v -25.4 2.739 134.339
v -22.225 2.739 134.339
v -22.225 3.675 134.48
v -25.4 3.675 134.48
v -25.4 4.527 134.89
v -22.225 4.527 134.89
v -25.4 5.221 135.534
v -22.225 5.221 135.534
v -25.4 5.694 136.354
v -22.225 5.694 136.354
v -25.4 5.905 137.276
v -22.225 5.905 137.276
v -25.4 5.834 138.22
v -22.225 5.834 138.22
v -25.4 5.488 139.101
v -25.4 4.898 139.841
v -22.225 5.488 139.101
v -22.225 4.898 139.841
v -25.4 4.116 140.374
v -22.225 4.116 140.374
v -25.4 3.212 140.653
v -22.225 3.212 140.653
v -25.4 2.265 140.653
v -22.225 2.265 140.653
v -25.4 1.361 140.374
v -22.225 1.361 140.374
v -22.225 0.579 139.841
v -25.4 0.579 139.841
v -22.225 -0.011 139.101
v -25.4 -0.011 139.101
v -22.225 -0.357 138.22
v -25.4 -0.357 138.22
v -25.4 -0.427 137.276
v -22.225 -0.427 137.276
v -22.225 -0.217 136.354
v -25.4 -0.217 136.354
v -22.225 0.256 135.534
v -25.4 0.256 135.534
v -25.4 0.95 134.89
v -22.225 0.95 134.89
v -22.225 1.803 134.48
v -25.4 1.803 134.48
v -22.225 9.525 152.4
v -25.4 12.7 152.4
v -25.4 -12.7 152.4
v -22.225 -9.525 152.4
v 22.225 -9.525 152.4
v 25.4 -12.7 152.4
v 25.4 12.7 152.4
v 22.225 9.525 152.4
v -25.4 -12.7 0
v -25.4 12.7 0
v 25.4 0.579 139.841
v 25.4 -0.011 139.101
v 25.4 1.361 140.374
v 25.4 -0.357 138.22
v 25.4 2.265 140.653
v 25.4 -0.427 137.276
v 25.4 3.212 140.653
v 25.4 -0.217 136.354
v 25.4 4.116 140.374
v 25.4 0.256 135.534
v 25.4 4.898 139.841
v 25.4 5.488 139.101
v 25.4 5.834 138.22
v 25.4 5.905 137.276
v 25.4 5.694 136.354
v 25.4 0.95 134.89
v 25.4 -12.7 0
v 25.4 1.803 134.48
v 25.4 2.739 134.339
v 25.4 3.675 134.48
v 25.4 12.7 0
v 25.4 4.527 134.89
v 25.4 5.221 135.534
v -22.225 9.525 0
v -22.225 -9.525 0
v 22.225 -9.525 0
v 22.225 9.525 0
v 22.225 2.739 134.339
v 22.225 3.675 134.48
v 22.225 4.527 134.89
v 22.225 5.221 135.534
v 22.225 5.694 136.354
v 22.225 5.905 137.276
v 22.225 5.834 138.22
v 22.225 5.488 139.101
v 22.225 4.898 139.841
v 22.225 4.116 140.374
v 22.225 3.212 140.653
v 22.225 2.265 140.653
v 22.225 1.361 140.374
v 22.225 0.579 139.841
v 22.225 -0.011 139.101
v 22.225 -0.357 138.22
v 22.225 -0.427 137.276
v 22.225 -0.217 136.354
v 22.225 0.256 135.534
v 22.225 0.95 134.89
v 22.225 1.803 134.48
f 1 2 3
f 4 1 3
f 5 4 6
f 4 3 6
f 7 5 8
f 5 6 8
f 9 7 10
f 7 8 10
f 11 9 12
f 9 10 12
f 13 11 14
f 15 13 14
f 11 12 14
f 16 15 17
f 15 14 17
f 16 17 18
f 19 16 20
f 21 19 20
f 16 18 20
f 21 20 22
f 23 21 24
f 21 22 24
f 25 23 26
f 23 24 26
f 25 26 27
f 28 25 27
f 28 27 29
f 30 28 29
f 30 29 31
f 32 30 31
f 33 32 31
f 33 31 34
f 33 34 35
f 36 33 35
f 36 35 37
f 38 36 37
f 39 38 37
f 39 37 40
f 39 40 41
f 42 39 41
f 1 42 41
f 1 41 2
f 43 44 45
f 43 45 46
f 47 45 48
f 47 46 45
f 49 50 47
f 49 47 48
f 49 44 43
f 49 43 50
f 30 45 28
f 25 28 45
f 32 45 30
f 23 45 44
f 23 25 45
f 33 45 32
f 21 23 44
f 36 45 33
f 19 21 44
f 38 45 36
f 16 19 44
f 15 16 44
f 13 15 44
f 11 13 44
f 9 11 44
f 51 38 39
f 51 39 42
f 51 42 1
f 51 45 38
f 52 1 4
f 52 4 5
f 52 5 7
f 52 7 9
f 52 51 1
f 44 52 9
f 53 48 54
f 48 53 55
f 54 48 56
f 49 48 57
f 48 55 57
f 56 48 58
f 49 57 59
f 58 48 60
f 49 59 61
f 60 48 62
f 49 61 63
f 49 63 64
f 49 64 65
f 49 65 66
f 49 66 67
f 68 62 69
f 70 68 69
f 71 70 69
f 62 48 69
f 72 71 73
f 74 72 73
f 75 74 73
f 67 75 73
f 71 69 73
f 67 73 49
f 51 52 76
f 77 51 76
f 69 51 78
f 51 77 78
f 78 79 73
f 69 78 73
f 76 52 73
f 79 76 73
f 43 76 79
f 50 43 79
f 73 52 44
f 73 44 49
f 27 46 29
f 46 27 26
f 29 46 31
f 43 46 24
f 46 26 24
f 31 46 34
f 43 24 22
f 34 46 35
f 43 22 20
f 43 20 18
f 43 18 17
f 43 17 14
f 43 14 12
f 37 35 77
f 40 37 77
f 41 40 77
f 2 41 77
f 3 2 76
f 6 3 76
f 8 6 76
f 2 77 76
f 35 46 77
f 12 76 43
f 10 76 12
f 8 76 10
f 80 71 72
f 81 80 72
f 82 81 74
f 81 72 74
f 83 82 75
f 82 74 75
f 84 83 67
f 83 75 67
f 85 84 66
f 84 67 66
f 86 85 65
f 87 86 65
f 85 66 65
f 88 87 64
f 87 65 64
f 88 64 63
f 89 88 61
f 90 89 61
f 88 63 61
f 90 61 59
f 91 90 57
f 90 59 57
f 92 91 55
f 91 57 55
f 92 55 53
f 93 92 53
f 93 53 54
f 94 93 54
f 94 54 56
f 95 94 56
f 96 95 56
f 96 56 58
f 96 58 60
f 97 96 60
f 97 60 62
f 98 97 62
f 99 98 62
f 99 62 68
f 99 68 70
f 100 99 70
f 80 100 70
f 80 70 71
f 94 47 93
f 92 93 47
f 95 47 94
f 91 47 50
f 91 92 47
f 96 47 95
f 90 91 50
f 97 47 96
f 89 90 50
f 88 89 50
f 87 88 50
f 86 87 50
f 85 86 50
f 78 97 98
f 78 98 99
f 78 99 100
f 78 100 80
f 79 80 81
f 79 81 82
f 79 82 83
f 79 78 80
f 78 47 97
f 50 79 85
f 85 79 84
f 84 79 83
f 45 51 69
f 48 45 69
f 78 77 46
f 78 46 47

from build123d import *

# Parameters (mm, degrees)
SKETCH1_W           = 50.8
SKETCH1_H           = 25.4
SKETCH1_W_2         = 44.45
SKETCH1_H_2         = 19.05
BOSS_EXTRUDE1_DEPTH = 152.4
SKETCH2_R           = 3.175
CUT_EXTRUDE1_DEPTH  = 162.144934764


with BuildPart() as part:
    # Sketch1 → Boss-Extrude1 (new body)
    with BuildSketch(Plane.XY):
        Rectangle(SKETCH1_W, SKETCH1_H)
        Rectangle(SKETCH1_W_2, SKETCH1_H_2, mode=Mode.SUBTRACT)
    extrude(amount=BOSS_EXTRUDE1_DEPTH)

    # Sketch2 → Cut-Extrude1 (cut, through all)
    with BuildSketch(Plane(origin=(25.4, 0, 0), x_dir=(0, 0, -1), z_dir=(1, 0, 0))):
        with Locations((-137.513740162, 2.738654121)):
            Circle(SKETCH2_R)
    extrude(amount=-CUT_EXTRUDE1_DEPTH, mode=Mode.SUBTRACT)


solid = part.part
